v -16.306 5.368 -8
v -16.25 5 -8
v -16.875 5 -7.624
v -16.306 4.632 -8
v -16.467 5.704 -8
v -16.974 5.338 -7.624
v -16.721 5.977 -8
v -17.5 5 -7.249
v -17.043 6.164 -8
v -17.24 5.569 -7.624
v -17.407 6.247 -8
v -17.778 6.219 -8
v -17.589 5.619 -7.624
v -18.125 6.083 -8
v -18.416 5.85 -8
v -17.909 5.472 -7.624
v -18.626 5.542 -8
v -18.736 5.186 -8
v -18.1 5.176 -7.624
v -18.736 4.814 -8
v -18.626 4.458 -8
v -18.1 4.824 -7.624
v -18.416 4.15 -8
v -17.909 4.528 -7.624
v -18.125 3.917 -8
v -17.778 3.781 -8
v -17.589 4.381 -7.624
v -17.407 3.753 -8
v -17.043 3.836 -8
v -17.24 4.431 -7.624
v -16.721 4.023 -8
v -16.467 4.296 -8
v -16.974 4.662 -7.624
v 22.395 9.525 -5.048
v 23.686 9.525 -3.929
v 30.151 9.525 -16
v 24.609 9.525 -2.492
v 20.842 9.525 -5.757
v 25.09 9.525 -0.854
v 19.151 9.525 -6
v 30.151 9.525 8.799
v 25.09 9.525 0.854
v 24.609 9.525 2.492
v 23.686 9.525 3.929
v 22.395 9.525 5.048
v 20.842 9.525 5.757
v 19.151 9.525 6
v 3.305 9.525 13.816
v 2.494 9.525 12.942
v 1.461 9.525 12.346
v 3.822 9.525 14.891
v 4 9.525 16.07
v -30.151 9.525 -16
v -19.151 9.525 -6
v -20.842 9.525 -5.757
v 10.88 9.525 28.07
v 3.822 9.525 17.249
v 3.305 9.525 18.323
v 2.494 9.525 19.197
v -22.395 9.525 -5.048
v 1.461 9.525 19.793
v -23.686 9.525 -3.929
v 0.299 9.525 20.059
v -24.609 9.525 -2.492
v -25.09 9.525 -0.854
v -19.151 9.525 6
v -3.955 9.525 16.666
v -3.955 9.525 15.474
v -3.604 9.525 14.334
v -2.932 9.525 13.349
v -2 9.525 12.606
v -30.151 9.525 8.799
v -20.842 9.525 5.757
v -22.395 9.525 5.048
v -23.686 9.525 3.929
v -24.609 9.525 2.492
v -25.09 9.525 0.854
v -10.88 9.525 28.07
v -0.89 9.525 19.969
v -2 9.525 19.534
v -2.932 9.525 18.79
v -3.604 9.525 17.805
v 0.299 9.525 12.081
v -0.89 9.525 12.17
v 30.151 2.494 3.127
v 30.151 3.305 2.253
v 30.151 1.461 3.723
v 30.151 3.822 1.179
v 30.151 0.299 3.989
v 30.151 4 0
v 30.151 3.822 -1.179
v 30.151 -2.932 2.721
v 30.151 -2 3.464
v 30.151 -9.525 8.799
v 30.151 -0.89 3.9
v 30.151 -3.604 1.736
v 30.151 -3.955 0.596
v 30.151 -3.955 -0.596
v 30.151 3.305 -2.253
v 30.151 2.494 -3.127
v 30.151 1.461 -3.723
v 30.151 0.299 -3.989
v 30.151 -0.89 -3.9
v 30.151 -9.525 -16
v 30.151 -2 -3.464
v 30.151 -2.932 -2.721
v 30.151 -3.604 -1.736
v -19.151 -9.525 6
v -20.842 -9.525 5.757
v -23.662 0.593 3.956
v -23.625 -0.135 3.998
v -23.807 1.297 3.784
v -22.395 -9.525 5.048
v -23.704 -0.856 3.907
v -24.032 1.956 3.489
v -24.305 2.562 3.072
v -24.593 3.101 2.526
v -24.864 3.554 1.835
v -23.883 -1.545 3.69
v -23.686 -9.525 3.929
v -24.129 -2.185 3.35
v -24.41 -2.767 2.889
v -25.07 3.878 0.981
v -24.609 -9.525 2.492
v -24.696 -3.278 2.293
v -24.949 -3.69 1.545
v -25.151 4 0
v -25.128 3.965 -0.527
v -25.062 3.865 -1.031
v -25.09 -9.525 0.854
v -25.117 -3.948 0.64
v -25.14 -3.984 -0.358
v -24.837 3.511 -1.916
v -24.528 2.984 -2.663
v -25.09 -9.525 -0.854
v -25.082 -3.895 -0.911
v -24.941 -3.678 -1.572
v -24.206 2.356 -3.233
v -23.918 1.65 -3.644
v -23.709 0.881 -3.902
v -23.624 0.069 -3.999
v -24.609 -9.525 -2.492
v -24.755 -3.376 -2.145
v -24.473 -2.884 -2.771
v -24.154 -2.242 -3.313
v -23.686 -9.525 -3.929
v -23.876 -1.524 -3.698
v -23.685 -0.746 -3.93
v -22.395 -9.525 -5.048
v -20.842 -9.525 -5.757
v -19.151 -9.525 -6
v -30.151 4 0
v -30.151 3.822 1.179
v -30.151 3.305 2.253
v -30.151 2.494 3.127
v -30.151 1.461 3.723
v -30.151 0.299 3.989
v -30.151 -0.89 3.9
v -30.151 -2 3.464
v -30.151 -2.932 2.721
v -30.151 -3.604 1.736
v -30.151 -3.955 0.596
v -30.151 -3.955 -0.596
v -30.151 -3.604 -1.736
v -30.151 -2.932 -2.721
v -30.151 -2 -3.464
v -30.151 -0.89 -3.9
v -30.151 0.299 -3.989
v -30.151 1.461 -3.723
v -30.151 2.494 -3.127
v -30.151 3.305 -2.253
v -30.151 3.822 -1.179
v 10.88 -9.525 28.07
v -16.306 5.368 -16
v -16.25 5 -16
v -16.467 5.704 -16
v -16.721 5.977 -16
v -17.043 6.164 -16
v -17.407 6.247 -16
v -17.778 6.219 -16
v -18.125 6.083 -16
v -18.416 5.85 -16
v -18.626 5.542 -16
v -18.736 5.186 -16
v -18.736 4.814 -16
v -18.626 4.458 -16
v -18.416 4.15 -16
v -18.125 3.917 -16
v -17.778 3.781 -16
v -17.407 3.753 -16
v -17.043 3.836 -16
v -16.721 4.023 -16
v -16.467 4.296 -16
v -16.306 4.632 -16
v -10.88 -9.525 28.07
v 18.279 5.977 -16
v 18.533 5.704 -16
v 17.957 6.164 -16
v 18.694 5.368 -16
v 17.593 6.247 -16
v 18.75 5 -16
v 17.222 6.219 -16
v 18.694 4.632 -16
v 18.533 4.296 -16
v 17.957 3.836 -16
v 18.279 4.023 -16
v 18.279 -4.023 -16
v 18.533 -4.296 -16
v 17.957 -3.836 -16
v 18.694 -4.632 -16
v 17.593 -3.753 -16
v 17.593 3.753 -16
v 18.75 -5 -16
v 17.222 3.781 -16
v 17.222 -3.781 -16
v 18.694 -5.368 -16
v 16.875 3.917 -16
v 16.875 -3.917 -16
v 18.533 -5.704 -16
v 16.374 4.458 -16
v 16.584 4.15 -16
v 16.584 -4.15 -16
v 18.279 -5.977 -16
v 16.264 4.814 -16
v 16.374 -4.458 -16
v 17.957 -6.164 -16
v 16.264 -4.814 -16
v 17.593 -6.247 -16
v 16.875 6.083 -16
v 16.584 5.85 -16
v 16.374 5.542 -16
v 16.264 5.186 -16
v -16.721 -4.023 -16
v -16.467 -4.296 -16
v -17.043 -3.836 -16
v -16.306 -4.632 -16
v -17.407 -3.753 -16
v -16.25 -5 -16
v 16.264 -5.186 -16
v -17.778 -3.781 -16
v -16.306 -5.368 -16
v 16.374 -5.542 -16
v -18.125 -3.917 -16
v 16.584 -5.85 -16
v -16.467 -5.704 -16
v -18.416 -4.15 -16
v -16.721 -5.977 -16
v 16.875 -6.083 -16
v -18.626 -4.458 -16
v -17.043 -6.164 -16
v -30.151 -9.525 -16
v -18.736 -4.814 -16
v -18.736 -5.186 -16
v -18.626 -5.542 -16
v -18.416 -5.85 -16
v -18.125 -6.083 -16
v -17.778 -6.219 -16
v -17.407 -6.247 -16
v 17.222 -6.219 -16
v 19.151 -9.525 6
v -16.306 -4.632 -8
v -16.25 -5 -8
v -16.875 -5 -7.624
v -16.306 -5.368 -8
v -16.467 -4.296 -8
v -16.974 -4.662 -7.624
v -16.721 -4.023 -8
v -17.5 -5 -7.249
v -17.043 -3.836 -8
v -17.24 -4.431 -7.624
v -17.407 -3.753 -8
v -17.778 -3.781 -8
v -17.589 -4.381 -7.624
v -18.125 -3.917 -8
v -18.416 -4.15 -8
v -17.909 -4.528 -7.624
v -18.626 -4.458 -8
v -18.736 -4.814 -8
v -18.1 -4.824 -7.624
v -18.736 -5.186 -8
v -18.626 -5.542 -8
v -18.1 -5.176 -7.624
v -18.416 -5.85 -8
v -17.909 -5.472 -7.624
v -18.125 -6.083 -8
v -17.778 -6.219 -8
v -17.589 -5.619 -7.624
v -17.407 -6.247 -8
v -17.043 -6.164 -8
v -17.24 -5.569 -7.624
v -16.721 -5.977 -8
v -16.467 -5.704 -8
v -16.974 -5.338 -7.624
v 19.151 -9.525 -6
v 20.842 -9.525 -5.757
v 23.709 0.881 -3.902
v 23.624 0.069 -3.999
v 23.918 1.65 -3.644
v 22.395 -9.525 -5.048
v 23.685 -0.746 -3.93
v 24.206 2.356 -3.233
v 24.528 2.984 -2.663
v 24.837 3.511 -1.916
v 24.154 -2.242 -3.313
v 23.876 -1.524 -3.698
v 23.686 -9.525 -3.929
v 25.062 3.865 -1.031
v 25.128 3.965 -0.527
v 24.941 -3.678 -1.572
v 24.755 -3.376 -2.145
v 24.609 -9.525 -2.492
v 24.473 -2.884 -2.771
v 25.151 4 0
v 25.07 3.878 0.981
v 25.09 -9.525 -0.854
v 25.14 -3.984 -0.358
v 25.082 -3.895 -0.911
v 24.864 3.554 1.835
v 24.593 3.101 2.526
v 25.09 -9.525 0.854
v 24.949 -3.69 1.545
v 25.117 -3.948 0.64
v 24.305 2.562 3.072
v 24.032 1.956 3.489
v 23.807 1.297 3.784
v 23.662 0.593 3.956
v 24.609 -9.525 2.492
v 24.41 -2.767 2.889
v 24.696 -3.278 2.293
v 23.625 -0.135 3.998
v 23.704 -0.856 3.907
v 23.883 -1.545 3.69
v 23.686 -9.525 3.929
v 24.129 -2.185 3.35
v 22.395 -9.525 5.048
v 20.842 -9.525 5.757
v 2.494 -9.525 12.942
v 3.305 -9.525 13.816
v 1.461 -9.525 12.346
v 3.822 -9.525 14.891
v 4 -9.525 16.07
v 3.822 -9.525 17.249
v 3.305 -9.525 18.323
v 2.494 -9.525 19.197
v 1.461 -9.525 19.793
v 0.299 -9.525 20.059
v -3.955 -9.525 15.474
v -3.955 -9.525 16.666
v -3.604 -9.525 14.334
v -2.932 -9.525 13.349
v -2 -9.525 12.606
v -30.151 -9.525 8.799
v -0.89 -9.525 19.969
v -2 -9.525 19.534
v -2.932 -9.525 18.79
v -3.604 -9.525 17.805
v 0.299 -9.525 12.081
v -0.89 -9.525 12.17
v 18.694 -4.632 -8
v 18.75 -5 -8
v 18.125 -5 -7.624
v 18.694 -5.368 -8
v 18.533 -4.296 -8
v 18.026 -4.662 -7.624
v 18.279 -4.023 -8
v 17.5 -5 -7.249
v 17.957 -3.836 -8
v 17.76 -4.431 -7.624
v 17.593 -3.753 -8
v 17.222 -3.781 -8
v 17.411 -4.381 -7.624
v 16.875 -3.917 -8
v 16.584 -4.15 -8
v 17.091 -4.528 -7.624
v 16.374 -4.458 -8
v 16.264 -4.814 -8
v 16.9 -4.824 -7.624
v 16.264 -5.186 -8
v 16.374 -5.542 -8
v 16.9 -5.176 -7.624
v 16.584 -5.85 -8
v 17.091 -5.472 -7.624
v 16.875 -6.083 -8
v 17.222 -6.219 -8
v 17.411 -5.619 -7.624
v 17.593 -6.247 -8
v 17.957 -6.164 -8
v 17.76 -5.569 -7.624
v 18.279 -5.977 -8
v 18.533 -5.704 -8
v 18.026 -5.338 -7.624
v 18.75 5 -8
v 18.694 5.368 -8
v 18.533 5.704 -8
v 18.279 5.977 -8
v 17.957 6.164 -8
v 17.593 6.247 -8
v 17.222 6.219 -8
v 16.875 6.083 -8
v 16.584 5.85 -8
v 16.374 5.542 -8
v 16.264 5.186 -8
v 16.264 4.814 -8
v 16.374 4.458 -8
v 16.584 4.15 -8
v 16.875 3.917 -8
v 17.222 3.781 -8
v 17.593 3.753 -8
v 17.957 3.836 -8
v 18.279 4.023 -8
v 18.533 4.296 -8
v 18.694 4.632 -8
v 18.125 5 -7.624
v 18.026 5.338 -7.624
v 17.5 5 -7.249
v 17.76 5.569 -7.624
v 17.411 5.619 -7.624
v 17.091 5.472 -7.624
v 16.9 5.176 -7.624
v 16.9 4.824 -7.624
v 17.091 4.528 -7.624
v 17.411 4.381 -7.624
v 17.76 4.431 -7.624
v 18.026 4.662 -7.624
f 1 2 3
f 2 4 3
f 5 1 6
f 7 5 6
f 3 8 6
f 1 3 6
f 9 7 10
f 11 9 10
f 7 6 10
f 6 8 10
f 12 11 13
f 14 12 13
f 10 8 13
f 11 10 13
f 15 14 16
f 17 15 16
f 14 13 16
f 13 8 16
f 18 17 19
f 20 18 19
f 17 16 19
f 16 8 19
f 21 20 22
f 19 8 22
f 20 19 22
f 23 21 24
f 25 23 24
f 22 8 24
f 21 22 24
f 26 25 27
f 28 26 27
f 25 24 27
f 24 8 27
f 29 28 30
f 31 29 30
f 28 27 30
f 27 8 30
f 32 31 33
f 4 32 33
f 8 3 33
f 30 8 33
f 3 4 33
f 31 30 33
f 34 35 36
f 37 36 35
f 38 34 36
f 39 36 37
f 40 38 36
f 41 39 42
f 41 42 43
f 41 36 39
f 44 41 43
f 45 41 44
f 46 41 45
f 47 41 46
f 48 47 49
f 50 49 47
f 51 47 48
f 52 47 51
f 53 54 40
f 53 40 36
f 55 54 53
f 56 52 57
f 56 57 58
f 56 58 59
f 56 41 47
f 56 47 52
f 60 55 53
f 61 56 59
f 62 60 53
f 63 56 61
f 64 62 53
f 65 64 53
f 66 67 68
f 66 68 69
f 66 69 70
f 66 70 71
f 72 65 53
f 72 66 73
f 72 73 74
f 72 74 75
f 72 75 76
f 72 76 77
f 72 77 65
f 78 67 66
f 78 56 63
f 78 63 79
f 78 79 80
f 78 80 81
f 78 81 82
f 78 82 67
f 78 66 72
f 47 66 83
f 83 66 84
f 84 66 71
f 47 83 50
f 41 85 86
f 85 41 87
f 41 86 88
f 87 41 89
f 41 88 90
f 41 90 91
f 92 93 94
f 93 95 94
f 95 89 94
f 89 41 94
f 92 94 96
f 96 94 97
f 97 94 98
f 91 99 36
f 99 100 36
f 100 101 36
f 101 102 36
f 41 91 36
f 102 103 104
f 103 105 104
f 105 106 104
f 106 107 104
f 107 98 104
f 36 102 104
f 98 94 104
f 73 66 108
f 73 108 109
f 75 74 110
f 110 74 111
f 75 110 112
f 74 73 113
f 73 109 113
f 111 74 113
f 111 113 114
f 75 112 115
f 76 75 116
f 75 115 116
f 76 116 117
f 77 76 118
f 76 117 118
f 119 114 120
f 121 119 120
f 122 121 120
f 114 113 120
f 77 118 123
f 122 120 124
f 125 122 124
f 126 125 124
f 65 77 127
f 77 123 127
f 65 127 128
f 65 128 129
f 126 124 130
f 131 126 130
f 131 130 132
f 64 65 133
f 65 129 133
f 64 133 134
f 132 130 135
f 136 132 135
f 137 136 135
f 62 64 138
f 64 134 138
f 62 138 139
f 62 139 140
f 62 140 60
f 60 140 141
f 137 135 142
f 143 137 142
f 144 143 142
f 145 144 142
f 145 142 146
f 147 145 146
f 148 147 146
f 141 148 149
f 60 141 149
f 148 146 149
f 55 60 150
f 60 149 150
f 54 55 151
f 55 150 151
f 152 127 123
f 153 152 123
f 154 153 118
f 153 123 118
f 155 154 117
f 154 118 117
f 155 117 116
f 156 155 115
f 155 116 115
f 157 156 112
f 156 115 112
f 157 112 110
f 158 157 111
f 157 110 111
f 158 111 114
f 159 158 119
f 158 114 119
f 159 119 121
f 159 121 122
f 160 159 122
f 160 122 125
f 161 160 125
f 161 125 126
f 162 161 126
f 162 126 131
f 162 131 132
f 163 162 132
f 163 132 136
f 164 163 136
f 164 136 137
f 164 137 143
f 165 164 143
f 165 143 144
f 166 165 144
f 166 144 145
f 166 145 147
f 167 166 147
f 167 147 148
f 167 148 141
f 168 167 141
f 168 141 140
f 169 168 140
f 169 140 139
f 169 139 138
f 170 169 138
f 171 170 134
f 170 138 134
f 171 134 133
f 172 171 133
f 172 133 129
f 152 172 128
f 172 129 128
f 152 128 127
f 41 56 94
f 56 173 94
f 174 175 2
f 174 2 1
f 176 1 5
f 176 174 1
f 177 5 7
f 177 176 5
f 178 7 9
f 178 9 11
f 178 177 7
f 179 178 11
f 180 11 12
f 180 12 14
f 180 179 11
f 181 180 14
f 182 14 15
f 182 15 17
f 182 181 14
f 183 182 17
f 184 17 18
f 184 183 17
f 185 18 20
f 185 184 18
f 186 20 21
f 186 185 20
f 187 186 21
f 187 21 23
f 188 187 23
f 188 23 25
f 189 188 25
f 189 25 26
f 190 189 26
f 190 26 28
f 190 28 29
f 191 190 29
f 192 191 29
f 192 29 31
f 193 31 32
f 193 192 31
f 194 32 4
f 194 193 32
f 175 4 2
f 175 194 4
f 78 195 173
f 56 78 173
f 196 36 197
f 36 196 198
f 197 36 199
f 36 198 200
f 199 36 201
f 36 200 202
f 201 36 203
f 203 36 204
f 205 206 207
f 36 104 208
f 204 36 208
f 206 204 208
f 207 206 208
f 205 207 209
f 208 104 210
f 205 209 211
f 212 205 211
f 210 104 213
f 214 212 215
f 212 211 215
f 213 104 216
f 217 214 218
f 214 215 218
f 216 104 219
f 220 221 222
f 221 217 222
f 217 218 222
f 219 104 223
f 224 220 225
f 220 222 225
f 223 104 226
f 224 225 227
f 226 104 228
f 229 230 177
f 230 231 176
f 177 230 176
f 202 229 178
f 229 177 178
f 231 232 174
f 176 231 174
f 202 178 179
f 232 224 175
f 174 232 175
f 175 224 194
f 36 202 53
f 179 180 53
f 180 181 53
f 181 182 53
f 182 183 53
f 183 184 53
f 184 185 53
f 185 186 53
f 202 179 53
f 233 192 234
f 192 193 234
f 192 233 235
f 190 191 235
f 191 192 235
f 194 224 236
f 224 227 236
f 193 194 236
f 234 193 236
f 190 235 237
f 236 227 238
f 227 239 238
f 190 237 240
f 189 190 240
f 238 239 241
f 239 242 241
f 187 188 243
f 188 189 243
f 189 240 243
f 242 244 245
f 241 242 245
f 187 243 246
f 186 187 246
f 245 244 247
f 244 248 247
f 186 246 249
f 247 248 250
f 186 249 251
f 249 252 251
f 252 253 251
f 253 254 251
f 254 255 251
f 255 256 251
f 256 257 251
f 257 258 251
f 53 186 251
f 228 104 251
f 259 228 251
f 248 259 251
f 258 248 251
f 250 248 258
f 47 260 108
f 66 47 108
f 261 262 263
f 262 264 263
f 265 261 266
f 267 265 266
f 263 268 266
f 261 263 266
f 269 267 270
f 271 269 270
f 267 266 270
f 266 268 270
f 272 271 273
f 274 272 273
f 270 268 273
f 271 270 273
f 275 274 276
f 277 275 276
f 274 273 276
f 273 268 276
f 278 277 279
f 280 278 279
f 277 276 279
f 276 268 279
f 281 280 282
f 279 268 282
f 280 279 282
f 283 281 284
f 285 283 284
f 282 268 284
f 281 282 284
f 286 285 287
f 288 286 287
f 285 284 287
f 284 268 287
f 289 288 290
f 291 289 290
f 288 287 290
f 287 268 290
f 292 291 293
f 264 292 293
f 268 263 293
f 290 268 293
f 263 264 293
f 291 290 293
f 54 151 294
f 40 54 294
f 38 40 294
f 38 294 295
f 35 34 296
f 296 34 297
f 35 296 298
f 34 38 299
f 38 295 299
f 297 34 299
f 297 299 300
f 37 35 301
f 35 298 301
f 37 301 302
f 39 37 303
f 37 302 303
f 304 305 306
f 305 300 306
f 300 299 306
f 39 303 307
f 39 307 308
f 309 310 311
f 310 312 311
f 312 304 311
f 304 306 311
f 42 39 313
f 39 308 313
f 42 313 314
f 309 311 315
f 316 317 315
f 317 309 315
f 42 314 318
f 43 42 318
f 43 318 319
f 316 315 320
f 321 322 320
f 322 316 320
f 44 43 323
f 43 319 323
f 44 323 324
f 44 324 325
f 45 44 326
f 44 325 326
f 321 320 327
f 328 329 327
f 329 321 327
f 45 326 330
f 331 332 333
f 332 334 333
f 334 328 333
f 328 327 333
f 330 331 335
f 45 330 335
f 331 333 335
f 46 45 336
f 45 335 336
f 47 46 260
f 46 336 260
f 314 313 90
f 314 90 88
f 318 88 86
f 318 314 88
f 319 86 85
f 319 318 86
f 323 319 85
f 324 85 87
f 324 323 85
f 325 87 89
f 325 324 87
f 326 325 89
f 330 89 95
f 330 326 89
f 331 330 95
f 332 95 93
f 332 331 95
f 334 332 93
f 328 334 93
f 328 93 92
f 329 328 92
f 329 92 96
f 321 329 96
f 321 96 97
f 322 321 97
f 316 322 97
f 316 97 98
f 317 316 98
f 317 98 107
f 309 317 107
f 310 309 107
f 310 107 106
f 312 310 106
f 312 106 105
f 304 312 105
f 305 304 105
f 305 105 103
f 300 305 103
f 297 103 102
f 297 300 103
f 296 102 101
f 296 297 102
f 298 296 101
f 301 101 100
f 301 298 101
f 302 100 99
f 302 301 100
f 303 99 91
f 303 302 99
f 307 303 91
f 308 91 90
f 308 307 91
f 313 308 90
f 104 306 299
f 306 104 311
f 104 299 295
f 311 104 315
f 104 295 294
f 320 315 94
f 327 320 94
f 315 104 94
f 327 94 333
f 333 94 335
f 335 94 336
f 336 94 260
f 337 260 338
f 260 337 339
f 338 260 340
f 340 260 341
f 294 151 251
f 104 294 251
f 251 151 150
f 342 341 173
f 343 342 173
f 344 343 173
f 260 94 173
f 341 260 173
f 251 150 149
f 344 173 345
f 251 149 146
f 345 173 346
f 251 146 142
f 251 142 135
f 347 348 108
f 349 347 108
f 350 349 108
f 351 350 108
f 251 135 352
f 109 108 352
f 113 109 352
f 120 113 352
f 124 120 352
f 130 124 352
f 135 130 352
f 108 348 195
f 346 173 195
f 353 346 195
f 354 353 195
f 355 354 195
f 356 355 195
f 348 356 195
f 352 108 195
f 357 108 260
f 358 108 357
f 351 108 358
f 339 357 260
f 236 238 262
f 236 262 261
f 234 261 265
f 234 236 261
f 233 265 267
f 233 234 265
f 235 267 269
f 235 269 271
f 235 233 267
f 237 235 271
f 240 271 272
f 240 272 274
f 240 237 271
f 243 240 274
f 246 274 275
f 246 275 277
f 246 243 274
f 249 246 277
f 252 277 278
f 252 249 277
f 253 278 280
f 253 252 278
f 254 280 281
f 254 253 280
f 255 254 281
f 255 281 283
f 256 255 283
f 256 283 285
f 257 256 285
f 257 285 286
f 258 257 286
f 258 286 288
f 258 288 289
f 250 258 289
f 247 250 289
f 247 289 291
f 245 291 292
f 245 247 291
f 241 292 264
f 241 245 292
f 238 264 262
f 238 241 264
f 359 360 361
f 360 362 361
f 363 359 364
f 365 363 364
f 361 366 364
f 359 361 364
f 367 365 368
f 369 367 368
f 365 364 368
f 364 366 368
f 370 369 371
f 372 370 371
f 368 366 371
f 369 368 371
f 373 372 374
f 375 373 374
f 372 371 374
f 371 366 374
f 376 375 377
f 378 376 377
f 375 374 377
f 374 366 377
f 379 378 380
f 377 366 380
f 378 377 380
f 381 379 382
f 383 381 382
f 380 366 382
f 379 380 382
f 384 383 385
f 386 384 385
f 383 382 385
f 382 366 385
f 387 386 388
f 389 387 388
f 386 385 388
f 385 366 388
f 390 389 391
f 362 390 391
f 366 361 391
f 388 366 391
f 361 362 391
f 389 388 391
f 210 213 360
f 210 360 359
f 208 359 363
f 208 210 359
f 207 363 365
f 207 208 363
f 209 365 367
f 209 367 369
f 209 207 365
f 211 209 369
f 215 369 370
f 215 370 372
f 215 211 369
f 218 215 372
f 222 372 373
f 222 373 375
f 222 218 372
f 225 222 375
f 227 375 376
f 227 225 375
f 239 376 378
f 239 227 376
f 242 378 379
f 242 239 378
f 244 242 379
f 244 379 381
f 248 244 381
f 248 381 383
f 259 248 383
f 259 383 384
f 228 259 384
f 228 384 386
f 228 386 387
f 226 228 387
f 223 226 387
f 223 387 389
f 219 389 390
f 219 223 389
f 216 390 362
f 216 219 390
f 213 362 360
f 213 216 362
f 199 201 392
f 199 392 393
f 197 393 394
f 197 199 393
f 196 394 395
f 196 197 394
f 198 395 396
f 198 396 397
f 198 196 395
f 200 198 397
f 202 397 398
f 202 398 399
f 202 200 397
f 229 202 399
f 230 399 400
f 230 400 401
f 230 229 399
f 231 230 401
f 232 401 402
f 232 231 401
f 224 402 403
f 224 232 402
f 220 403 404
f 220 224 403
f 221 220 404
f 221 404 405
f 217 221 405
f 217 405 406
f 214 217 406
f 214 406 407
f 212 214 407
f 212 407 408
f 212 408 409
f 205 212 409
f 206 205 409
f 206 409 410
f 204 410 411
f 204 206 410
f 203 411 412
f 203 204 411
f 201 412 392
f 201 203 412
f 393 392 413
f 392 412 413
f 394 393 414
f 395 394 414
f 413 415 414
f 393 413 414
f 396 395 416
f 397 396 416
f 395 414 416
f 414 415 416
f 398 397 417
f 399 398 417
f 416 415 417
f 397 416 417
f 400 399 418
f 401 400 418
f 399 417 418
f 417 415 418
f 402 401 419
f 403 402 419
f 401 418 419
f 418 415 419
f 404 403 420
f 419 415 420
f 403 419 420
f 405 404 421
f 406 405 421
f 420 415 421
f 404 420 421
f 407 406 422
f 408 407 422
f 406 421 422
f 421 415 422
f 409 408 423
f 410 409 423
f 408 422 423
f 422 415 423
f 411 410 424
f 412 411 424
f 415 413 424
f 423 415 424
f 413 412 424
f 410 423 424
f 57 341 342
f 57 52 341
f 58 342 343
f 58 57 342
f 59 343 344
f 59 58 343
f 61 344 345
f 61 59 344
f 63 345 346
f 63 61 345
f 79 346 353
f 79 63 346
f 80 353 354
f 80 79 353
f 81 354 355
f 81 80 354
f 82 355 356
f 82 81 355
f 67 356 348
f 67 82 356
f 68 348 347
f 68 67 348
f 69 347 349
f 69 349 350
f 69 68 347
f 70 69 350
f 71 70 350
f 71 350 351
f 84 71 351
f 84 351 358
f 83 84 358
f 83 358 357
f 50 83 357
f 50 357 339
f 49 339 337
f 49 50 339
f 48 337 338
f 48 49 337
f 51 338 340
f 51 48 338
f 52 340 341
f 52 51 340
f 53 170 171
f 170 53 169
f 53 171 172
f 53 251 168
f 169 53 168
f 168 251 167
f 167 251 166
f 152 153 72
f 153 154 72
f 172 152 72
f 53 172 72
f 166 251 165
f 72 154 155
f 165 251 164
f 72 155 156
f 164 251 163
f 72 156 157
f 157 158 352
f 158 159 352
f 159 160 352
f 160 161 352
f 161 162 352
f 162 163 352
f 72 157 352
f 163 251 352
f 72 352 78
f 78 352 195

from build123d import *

# Parameters (mm, degrees)
SKETCH_R          = 4
PAD_DEPTH         = 9.525
SKETCH001_R       = 4
POCKET_DEPTH      = 30.152111
POCKET_DEPTH_BACK = 30.152111
SKETCH003_R       = 1.25
HOLE_DEPTH        = 8
HOLE_TIPS_R       = 1.25


with BuildPart() as part:
    # Sketch → Pad (new body, symmetric)
    with BuildSketch(Plane.XZ):
        Polygon((-10.880411, 28.06969), (10.880411, 28.06969), (30.151111, 8.79899), (30.151111, -16), (-30.151111, -16), (-30.151111, 8.79899), align=None)
        with Locations((0, 16.06969)):
            Circle(SKETCH_R, mode=Mode.SUBTRACT)
        with BuildLine():
            ThreePointArc((-19.151111, 6), (-25.151111, 0), (-19.151111, -6))
            Line((-19.151111, -6), (19.151111, -6))
            ThreePointArc((19.151111, -6), (25.151111, 0), (19.151111, 6))
            Line((19.151111, 6), (-19.151111, 6))
        make_face(mode=Mode.SUBTRACT)
    extrude(amount=PAD_DEPTH, both=True)

    # Sketch001 → Pocket (cut, two sides)
    with BuildSketch(Plane.YZ) as pocket_sk:
        Circle(SKETCH001_R)
    extrude(amount=-POCKET_DEPTH, mode=Mode.SUBTRACT)
    extrude(pocket_sk.sketch, amount=POCKET_DEPTH_BACK, mode=Mode.SUBTRACT)

    # Sketch003 → Hole (cut)
    with BuildSketch(Plane.XY.offset(-16)):
        with Locations((-17.5, 5)):
            Circle(SKETCH003_R)
        with Locations((-17.5, -5)):
            Circle(SKETCH003_R)
        with Locations((17.5, -5)):
            Circle(SKETCH003_R)
        with Locations((17.5, 5)):
            Circle(SKETCH003_R)
    extrude(amount=HOLE_DEPTH, mode=Mode.SUBTRACT)

    # Hole tips → Hole tip 1 section 0
    with BuildSketch(Plane.XY.offset(-8), mode=Mode.PRIVATE) as hole_tip_1_s0:
        with Locations((-17.5, 5)):
            Circle(HOLE_TIPS_R)
    loft([hole_tip_1_s0.sketch, Vertex(-17.5, 5, -7.248924)], mode=Mode.SUBTRACT)

    # Hole tips → Hole tip 2 section 0
    with BuildSketch(Plane.XY.offset(-8), mode=Mode.PRIVATE) as hole_tip_2_s0:
        with Locations((-17.5, -5)):
            Circle(HOLE_TIPS_R)
    loft([hole_tip_2_s0.sketch, Vertex(-17.5, -5, -7.248924)], mode=Mode.SUBTRACT)

    # Hole tips → Hole tip 3 section 0
    with BuildSketch(Plane.XY.offset(-8), mode=Mode.PRIVATE) as hole_tip_3_s0:
        with Locations((17.5, -5)):
            Circle(HOLE_TIPS_R)
    loft([hole_tip_3_s0.sketch, Vertex(17.5, -5, -7.248924)], mode=Mode.SUBTRACT)

    # Hole tips → Hole tip 4 section 0
    with BuildSketch(Plane.XY.offset(-8), mode=Mode.PRIVATE) as hole_tip_4_s0:
        with Locations((17.5, 5)):
            Circle(HOLE_TIPS_R)
    loft([hole_tip_4_s0.sketch, Vertex(17.5, 5, -7.248924)], mode=Mode.SUBTRACT)


solid = part.part
